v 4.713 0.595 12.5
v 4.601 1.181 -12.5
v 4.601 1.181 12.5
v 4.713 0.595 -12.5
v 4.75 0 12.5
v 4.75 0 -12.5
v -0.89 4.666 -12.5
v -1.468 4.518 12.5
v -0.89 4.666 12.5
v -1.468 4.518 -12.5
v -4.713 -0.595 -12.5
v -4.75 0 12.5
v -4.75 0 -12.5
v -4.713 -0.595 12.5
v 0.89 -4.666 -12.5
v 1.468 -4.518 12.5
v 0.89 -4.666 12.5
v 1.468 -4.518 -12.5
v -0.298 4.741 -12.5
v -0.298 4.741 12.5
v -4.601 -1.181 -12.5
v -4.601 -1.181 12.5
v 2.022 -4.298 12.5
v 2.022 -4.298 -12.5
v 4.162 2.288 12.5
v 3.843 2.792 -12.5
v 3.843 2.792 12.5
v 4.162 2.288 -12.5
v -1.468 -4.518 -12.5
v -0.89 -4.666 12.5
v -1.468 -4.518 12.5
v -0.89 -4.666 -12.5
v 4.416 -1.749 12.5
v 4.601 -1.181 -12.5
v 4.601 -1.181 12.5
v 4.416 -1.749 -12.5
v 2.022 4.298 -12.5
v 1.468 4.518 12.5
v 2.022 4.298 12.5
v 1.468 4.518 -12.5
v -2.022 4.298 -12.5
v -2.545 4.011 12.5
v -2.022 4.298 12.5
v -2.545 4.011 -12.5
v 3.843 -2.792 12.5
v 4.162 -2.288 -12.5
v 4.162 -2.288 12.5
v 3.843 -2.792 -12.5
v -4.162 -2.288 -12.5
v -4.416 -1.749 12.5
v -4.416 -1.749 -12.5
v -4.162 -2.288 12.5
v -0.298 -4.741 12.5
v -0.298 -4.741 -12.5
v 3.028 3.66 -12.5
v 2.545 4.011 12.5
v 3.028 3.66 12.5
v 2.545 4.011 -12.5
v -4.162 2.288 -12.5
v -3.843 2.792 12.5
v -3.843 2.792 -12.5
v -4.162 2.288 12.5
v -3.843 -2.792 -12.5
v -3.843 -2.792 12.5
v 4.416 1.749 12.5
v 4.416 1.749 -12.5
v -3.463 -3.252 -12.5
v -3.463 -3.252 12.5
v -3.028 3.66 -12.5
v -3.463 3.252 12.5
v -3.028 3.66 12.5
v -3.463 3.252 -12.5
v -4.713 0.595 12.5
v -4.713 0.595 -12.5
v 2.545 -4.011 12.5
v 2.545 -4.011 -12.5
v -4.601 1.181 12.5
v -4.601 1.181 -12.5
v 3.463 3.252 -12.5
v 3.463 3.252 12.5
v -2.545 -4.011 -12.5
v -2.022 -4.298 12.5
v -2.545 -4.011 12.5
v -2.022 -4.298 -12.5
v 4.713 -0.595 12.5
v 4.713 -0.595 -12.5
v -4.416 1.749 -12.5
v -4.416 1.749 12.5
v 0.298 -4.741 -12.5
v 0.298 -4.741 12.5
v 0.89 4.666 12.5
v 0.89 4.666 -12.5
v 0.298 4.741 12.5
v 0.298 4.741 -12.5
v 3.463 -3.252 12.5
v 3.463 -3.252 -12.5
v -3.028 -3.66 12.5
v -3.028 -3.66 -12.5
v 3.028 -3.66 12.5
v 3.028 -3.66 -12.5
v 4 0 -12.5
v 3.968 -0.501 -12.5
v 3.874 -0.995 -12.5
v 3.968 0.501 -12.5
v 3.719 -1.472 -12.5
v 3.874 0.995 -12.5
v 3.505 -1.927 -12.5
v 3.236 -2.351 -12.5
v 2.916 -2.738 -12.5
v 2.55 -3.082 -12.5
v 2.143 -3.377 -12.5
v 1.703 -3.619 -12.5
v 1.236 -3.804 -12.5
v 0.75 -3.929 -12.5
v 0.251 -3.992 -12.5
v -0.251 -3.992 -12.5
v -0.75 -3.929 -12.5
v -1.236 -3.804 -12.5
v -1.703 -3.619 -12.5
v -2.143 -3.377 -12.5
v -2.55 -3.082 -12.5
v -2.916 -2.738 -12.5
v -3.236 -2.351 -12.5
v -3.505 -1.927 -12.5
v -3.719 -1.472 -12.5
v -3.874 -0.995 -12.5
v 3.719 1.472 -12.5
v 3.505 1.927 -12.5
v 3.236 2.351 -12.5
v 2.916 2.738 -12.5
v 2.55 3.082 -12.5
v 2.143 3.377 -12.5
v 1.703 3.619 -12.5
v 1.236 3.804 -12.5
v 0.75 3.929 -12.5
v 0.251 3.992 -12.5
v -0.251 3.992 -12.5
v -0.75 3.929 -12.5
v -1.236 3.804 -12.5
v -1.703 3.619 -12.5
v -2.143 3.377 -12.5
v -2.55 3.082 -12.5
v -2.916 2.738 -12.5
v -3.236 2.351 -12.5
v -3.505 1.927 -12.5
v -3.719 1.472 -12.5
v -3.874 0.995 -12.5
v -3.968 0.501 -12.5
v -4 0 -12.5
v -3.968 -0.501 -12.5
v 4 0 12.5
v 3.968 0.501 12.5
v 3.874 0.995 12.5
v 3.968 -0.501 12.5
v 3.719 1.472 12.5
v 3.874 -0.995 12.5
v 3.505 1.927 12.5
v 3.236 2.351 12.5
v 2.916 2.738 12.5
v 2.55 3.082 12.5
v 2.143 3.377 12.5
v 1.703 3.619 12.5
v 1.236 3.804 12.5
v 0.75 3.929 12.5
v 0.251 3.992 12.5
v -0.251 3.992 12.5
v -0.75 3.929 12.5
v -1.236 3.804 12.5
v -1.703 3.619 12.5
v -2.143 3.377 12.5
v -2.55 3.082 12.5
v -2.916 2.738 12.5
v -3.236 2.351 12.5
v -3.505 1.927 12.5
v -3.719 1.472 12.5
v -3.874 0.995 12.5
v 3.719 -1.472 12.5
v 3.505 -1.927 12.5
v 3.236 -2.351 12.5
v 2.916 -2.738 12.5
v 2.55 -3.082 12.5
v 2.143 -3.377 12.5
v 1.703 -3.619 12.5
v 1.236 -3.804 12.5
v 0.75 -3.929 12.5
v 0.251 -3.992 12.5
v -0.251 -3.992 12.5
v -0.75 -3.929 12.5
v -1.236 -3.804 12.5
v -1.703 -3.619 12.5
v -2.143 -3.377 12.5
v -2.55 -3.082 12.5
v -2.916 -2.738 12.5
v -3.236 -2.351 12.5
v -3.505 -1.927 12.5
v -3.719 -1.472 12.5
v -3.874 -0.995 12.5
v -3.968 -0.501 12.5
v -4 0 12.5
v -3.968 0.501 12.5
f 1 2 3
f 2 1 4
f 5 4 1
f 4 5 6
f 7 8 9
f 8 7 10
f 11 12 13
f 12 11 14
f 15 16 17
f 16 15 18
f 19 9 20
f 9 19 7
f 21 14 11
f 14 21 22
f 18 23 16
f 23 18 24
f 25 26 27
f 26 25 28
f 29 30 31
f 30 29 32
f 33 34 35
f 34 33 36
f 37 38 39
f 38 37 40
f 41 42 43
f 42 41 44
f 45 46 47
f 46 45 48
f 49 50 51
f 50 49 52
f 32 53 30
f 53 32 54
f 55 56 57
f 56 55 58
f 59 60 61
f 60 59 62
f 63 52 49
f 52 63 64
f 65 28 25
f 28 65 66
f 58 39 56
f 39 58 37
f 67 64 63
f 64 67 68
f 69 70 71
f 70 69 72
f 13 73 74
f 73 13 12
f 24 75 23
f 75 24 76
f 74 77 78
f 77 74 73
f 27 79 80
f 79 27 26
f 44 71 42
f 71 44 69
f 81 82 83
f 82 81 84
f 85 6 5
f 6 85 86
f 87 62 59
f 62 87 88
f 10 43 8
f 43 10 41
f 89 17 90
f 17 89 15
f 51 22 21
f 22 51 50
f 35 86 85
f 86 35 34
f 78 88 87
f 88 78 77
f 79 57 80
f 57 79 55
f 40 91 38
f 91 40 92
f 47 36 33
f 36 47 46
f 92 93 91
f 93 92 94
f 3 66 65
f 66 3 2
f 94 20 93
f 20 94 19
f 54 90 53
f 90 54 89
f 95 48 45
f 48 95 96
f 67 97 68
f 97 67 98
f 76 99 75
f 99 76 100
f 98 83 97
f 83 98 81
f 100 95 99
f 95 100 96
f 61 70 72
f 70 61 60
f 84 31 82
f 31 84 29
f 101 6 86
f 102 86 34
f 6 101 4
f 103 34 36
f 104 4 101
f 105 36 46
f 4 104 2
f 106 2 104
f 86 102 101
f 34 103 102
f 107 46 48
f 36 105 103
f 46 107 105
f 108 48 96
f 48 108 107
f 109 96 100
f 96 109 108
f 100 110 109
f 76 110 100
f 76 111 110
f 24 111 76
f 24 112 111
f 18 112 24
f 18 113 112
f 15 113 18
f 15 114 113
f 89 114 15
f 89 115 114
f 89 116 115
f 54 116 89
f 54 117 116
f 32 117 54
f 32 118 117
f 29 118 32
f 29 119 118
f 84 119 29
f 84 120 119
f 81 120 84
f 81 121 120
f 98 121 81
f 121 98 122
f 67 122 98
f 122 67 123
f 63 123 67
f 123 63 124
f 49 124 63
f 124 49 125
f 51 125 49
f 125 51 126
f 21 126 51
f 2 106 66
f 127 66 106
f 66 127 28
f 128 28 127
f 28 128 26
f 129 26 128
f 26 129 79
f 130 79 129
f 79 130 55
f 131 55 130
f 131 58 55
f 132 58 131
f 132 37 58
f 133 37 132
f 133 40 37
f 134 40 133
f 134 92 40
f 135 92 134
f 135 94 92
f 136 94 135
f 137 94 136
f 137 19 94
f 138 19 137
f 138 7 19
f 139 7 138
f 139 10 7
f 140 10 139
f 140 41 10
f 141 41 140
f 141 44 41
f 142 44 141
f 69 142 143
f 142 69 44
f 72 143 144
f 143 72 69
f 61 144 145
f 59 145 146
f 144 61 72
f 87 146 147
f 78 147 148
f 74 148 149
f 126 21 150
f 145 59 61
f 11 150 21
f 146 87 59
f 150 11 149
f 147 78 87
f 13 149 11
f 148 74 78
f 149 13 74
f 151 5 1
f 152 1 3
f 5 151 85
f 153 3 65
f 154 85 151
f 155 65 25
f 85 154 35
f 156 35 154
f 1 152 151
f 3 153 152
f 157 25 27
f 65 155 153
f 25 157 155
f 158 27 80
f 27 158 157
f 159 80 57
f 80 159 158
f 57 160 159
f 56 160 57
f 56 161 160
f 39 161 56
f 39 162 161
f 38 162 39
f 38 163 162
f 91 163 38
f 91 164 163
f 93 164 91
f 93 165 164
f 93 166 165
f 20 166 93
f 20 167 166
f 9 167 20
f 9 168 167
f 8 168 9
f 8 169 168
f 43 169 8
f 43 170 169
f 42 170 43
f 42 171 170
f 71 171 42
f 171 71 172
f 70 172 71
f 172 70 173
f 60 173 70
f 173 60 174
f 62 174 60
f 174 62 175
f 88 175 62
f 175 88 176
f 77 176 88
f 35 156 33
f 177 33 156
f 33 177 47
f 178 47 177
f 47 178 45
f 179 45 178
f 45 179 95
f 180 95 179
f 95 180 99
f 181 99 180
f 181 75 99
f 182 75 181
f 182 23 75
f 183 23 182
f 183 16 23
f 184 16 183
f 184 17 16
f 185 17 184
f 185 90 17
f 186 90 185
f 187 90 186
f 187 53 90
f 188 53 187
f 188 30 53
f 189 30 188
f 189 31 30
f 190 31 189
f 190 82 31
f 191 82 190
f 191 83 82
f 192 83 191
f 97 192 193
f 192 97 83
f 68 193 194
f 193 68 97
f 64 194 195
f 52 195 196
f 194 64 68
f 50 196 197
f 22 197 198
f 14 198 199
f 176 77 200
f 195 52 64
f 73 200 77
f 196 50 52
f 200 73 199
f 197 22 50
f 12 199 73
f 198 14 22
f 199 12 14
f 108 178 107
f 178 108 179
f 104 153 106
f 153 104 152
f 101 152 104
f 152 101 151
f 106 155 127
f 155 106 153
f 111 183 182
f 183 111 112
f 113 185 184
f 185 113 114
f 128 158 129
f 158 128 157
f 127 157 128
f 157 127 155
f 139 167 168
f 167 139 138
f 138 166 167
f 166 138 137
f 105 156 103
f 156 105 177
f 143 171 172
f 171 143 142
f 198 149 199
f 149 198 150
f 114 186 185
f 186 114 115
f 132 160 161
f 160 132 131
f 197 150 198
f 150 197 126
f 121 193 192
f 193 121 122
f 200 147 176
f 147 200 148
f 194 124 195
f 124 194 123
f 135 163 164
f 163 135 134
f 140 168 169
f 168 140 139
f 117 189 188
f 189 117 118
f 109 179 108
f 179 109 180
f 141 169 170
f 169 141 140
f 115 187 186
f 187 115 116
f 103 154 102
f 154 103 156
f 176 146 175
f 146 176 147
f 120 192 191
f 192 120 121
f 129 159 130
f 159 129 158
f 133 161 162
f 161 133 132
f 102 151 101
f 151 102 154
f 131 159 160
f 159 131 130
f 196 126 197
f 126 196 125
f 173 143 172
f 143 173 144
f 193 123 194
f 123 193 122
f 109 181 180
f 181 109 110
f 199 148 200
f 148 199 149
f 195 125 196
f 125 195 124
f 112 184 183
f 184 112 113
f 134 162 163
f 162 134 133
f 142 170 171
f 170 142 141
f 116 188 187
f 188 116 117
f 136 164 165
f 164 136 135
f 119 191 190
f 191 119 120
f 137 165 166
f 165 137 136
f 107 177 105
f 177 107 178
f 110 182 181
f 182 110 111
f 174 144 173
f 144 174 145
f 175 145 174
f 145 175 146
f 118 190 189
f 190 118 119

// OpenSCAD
$fn = 50;


difference() {
	union() {
		translate(v = [0, 0, -12.5000000000]) {
			cylinder(h = 25, r = 4.7500000000);
		}
	}
	union() {
		translate(v = [0, 0, -100.0000000000]) {
			cylinder(h = 200, r = 4.0000000000);
		}
	}
}
